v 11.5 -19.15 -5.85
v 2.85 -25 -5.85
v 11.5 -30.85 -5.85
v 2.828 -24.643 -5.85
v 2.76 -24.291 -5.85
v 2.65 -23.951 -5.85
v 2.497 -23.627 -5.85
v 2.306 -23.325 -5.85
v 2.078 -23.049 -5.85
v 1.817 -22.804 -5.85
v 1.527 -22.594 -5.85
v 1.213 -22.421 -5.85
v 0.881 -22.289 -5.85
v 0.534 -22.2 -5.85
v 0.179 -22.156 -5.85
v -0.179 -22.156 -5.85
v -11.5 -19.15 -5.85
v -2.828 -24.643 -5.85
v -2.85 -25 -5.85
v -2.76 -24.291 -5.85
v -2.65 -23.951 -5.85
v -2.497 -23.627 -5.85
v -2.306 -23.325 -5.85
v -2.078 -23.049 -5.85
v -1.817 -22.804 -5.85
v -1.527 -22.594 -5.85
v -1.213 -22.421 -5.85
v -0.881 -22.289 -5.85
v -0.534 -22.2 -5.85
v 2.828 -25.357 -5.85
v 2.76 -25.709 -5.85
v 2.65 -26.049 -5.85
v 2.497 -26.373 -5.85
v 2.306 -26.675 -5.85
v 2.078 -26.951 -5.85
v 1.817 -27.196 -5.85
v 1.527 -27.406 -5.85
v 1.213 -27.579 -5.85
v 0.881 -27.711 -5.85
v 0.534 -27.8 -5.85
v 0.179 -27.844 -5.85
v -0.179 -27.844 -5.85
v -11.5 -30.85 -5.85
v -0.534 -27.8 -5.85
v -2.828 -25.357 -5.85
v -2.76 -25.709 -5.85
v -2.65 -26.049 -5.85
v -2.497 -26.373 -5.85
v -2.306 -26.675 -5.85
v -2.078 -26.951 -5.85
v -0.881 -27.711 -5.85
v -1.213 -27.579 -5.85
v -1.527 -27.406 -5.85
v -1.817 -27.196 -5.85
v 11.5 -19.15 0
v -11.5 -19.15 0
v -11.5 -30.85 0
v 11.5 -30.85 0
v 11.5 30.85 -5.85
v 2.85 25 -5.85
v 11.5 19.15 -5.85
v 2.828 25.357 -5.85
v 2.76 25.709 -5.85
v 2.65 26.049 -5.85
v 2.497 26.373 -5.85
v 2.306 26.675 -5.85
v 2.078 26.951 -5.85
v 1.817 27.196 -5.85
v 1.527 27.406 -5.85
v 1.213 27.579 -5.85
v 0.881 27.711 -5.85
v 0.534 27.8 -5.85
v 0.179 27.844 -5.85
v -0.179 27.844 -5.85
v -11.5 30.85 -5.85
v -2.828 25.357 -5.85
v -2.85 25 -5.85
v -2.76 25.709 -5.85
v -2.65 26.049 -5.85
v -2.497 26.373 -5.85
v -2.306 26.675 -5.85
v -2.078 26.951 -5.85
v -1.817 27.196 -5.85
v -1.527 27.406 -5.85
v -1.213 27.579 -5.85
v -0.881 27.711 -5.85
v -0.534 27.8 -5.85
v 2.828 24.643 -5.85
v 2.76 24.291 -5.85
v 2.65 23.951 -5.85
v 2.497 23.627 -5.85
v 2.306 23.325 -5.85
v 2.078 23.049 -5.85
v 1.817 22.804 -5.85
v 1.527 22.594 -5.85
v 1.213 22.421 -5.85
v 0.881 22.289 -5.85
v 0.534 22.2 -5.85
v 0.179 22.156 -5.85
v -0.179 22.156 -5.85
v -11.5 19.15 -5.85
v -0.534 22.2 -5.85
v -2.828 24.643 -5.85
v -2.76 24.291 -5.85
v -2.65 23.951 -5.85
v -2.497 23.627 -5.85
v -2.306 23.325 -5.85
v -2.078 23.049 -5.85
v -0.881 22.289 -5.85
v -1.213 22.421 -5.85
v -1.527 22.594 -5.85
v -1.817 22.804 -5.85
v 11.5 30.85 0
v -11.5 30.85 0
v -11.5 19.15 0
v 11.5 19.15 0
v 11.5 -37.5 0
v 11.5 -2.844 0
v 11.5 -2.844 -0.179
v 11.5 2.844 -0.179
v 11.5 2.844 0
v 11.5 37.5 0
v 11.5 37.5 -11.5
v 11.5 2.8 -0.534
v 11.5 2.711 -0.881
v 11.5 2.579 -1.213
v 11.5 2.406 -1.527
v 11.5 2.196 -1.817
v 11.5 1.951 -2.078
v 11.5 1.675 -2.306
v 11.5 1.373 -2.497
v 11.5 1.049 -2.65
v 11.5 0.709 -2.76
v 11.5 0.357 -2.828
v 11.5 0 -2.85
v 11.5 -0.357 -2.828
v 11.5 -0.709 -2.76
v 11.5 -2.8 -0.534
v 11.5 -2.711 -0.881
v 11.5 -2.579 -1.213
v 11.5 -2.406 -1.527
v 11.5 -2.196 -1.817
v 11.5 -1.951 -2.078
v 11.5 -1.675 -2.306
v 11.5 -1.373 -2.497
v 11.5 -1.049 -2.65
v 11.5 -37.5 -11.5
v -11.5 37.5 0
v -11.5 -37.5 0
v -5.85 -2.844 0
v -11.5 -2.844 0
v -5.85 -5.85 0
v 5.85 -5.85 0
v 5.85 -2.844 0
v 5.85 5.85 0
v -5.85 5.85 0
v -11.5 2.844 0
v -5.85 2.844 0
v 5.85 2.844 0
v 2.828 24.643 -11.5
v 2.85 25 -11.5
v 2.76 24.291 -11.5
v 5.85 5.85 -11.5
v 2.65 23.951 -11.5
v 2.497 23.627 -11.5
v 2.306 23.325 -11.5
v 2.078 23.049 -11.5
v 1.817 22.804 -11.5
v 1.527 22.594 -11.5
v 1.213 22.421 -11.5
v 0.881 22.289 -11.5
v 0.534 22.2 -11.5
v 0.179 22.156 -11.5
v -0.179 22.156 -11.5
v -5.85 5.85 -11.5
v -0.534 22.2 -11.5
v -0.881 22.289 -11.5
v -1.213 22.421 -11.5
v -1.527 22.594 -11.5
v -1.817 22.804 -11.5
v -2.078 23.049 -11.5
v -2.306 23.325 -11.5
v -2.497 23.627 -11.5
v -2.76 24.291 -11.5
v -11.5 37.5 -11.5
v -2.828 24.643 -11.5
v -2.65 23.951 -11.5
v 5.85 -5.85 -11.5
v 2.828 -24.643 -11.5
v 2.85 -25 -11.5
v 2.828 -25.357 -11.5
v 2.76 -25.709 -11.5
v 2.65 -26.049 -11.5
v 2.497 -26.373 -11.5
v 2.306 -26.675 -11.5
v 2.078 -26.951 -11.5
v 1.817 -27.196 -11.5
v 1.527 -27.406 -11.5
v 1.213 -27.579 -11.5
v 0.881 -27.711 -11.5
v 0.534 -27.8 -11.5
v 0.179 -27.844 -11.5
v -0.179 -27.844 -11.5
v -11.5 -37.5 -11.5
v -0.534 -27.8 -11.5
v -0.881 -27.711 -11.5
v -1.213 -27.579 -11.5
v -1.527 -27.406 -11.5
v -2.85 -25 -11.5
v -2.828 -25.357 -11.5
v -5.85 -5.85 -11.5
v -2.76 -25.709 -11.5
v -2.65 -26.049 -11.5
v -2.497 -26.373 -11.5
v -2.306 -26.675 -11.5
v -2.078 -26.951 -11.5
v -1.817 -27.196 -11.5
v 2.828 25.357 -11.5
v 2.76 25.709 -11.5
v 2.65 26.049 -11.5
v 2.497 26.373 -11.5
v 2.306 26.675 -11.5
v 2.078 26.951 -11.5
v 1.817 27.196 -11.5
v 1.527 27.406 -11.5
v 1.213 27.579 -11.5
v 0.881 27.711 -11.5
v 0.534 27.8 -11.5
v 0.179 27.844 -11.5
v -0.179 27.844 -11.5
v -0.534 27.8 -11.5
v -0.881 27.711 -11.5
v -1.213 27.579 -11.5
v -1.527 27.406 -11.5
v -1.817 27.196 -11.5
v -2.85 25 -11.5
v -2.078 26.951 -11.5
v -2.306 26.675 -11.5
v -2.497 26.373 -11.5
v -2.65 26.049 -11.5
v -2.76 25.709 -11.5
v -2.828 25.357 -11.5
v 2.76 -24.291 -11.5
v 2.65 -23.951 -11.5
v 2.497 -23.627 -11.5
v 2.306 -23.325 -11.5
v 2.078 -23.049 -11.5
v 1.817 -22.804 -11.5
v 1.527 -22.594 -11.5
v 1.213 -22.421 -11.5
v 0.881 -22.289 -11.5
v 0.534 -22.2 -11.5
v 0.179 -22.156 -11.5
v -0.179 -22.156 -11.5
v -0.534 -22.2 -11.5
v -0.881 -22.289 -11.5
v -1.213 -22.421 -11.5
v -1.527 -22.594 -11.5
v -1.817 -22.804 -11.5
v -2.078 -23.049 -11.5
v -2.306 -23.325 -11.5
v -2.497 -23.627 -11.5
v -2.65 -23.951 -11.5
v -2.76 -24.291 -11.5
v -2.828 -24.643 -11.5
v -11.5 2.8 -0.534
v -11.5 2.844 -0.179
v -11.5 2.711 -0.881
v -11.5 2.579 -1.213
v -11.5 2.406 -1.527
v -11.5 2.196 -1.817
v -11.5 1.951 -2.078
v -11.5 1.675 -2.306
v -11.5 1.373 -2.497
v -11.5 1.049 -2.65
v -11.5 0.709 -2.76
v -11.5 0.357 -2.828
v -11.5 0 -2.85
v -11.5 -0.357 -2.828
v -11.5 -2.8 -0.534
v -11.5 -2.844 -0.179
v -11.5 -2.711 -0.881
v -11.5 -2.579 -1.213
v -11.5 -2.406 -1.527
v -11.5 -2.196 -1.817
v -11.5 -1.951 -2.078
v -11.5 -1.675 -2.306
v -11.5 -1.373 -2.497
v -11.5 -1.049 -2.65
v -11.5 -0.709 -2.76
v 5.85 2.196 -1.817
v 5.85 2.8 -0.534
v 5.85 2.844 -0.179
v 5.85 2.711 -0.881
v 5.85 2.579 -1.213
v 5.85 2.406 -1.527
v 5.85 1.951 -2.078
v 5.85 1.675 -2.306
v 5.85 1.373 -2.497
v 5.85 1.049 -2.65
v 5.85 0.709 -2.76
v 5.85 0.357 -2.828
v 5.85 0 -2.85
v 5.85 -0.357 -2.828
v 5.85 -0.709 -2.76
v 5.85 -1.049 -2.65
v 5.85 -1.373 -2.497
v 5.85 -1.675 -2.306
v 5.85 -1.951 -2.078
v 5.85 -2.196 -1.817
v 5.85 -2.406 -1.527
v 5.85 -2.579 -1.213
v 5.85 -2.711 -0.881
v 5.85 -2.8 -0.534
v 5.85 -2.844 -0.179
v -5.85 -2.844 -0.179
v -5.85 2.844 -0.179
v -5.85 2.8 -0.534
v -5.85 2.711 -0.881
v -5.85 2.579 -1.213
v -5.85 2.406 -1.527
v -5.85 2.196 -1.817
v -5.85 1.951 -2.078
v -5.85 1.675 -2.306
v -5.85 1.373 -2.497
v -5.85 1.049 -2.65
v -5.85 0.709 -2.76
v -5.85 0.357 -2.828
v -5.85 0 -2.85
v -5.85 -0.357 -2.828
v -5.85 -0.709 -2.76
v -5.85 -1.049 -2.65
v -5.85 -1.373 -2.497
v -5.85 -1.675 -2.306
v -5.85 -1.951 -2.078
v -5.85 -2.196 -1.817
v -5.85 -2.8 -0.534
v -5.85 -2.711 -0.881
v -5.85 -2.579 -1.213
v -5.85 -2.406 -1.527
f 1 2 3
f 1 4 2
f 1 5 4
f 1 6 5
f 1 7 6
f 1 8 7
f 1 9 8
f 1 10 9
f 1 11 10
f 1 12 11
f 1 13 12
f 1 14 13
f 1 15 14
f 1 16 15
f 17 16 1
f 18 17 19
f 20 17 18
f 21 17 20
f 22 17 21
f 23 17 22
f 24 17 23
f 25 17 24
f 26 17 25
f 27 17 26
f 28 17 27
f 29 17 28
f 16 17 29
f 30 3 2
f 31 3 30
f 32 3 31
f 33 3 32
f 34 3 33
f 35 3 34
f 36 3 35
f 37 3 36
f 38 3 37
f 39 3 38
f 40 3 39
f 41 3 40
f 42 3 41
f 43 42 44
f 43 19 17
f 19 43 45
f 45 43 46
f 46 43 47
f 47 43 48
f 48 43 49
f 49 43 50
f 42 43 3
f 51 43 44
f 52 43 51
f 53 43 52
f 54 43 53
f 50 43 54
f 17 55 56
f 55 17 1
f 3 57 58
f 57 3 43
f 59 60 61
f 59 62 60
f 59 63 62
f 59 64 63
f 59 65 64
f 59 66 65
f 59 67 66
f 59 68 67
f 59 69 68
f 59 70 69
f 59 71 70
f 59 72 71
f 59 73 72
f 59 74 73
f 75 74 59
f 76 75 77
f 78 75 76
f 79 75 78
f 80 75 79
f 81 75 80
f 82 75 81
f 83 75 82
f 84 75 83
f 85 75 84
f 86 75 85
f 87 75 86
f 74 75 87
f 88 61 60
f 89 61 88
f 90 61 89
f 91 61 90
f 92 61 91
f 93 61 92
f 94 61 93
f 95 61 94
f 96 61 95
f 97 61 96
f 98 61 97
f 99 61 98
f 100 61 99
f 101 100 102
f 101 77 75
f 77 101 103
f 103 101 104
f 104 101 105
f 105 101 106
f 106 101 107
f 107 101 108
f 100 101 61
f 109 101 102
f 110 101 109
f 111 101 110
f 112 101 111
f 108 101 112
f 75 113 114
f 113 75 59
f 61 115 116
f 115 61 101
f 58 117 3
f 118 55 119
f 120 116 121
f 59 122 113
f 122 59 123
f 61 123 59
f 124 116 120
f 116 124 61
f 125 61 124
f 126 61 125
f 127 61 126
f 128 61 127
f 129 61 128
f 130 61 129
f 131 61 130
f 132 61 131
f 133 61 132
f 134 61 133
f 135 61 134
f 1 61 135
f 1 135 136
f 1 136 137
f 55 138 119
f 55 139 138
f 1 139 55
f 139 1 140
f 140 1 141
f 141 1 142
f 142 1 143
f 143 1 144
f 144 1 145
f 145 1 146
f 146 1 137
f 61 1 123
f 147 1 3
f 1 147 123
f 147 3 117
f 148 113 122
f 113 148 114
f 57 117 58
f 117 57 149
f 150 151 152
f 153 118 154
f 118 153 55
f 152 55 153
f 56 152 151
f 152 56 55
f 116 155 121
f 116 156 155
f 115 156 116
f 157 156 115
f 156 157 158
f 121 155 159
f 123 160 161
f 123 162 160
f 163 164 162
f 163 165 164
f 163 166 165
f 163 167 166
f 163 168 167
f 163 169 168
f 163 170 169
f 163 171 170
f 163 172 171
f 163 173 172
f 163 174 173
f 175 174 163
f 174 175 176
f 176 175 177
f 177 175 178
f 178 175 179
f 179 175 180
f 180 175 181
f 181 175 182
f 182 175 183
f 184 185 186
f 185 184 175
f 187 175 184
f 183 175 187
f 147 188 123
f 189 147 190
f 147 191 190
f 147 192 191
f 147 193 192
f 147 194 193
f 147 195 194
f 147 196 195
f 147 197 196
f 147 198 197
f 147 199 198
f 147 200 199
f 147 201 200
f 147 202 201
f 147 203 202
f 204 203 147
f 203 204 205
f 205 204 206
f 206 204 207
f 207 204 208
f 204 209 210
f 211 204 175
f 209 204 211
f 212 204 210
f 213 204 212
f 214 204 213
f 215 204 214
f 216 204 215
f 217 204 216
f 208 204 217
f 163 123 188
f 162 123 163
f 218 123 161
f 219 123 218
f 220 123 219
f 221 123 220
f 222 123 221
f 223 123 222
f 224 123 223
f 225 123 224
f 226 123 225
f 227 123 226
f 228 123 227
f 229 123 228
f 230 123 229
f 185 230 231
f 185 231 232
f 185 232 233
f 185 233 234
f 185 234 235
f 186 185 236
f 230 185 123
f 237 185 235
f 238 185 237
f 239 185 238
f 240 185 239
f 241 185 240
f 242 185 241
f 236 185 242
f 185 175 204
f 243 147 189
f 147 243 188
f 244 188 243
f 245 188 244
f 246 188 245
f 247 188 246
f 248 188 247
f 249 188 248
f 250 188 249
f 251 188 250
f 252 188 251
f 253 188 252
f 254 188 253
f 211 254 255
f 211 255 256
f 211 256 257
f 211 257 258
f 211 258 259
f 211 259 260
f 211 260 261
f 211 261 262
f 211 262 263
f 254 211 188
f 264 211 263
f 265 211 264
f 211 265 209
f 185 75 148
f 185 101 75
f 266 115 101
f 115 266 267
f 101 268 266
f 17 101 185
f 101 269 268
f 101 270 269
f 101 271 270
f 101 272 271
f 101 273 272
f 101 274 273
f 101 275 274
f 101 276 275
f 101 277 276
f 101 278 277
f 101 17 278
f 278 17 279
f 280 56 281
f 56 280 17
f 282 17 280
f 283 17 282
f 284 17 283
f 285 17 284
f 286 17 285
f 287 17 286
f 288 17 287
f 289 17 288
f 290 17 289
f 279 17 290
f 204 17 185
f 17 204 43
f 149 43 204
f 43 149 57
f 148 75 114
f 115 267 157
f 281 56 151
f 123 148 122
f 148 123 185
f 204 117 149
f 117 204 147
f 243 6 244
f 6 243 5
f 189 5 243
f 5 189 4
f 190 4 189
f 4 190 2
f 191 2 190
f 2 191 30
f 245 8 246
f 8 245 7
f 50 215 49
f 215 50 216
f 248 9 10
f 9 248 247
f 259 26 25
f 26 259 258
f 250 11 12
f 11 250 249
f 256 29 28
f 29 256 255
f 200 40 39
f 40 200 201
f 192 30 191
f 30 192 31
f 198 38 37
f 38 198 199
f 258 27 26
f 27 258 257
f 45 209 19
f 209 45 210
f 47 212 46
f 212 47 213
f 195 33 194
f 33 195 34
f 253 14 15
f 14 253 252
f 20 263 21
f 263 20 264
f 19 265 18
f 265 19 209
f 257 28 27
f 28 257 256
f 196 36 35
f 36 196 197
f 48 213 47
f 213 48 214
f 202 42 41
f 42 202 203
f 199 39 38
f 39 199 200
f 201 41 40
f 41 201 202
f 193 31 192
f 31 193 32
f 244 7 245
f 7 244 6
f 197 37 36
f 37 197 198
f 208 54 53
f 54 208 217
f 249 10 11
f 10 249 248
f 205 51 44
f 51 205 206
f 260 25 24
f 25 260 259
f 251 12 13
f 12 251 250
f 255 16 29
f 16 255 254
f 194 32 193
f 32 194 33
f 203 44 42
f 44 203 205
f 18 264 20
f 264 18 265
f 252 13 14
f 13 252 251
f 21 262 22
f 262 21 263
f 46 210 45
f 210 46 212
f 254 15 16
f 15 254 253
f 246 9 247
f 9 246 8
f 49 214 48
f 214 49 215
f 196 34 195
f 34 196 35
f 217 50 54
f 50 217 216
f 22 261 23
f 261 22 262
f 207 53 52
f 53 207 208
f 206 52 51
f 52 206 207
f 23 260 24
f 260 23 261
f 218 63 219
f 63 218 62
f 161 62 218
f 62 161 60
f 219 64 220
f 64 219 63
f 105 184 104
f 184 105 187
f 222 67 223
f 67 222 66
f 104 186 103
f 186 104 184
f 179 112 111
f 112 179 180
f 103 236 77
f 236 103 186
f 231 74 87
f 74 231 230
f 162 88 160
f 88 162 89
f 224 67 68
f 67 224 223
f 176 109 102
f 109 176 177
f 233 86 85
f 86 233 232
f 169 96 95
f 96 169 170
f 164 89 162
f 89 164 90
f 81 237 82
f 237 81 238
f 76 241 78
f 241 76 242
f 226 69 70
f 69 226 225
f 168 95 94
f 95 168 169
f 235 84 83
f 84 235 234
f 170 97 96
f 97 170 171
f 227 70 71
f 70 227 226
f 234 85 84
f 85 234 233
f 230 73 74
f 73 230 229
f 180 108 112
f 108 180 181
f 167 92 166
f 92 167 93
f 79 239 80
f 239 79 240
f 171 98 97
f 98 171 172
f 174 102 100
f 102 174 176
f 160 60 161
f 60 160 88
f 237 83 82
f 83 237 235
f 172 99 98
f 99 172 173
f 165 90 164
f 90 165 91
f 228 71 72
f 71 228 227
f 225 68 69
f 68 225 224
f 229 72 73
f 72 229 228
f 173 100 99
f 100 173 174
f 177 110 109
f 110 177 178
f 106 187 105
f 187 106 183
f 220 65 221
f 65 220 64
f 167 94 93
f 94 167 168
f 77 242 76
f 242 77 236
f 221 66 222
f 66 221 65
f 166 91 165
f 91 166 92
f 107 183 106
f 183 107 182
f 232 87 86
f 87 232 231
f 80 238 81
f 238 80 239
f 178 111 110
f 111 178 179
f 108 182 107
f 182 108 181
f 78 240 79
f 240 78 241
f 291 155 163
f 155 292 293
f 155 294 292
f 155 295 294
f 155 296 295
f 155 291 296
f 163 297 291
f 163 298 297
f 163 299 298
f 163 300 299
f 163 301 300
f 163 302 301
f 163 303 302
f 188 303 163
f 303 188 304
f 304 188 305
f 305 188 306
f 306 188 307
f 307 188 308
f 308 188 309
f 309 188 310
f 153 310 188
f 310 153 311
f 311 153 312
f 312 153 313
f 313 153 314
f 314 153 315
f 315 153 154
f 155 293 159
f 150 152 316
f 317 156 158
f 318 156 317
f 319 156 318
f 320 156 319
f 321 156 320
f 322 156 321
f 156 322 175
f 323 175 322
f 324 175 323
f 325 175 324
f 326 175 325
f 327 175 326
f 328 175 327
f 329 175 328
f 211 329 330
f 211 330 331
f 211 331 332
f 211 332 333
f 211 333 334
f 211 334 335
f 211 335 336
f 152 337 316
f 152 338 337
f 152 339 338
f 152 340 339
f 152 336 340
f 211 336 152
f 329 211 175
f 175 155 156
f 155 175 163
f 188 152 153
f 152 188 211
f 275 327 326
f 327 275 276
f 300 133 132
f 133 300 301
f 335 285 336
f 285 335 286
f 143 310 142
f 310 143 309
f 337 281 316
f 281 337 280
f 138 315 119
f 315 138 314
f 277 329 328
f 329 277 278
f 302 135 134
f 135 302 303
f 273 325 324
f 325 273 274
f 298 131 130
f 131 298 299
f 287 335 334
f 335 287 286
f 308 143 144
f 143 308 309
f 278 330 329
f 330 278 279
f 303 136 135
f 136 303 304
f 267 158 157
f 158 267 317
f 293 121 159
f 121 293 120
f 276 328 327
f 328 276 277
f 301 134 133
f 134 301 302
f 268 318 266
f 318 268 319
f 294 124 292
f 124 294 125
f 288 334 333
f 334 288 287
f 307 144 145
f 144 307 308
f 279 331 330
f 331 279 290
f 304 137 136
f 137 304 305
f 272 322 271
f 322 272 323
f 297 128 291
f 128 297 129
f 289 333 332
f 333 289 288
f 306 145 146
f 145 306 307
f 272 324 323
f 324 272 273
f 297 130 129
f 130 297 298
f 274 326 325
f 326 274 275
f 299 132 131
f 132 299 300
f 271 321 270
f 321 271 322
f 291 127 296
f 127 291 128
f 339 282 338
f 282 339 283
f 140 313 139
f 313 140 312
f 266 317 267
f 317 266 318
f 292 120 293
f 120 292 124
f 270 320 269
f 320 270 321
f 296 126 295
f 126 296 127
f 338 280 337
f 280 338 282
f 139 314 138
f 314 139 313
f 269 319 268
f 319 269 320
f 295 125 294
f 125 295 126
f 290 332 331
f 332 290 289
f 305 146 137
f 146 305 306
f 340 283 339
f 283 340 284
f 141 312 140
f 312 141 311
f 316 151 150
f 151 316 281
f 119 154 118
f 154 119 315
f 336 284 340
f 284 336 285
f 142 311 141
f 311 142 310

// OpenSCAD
// file: YFrame.scad
/* Rahmenteile für die Y-Achse (Platine bewegt)
 */

/* Durchmesser Aluprofile */
stab_d = 11.7;

/* Abstand der Schienen (Mitte-Mitte) */
schienen = 50;

/* Blockhöhe - Schraube M5x30:
 * 30mm - 2*1mm (Unterlegscheibe) - 4.5mm = 23.5mm
 */
blockh = 23;

/* Höhe der Y-Einheit */
yframe_h = 75;

module yframe_klemmleiste(breite = 50) {
	difference() {
		translate([0,0,-blockh/4]) cube([breite, yframe_h, blockh/2], true);

		for (y = [-1, +1]) {
			translate([0, y*schienen/2, 0]) cube([100, stab_d, stab_d], true);
		}
	}
}
// main file
include <YFrame.scad>;

difference() {
	yframe_klemmleiste(breite=blockh);
	for (y = [-schienen/2, +schienen/2]) {
		translate([0,y,0]) cylinder(h=100, r=5.7/2, $fn=50, center=true);
	}
	cube([stab_d, stab_d, 100], true);
	rotate(90, [0,1,0]) cylinder(h=100, center=true, r=5.7/2, $fn=50);
}
